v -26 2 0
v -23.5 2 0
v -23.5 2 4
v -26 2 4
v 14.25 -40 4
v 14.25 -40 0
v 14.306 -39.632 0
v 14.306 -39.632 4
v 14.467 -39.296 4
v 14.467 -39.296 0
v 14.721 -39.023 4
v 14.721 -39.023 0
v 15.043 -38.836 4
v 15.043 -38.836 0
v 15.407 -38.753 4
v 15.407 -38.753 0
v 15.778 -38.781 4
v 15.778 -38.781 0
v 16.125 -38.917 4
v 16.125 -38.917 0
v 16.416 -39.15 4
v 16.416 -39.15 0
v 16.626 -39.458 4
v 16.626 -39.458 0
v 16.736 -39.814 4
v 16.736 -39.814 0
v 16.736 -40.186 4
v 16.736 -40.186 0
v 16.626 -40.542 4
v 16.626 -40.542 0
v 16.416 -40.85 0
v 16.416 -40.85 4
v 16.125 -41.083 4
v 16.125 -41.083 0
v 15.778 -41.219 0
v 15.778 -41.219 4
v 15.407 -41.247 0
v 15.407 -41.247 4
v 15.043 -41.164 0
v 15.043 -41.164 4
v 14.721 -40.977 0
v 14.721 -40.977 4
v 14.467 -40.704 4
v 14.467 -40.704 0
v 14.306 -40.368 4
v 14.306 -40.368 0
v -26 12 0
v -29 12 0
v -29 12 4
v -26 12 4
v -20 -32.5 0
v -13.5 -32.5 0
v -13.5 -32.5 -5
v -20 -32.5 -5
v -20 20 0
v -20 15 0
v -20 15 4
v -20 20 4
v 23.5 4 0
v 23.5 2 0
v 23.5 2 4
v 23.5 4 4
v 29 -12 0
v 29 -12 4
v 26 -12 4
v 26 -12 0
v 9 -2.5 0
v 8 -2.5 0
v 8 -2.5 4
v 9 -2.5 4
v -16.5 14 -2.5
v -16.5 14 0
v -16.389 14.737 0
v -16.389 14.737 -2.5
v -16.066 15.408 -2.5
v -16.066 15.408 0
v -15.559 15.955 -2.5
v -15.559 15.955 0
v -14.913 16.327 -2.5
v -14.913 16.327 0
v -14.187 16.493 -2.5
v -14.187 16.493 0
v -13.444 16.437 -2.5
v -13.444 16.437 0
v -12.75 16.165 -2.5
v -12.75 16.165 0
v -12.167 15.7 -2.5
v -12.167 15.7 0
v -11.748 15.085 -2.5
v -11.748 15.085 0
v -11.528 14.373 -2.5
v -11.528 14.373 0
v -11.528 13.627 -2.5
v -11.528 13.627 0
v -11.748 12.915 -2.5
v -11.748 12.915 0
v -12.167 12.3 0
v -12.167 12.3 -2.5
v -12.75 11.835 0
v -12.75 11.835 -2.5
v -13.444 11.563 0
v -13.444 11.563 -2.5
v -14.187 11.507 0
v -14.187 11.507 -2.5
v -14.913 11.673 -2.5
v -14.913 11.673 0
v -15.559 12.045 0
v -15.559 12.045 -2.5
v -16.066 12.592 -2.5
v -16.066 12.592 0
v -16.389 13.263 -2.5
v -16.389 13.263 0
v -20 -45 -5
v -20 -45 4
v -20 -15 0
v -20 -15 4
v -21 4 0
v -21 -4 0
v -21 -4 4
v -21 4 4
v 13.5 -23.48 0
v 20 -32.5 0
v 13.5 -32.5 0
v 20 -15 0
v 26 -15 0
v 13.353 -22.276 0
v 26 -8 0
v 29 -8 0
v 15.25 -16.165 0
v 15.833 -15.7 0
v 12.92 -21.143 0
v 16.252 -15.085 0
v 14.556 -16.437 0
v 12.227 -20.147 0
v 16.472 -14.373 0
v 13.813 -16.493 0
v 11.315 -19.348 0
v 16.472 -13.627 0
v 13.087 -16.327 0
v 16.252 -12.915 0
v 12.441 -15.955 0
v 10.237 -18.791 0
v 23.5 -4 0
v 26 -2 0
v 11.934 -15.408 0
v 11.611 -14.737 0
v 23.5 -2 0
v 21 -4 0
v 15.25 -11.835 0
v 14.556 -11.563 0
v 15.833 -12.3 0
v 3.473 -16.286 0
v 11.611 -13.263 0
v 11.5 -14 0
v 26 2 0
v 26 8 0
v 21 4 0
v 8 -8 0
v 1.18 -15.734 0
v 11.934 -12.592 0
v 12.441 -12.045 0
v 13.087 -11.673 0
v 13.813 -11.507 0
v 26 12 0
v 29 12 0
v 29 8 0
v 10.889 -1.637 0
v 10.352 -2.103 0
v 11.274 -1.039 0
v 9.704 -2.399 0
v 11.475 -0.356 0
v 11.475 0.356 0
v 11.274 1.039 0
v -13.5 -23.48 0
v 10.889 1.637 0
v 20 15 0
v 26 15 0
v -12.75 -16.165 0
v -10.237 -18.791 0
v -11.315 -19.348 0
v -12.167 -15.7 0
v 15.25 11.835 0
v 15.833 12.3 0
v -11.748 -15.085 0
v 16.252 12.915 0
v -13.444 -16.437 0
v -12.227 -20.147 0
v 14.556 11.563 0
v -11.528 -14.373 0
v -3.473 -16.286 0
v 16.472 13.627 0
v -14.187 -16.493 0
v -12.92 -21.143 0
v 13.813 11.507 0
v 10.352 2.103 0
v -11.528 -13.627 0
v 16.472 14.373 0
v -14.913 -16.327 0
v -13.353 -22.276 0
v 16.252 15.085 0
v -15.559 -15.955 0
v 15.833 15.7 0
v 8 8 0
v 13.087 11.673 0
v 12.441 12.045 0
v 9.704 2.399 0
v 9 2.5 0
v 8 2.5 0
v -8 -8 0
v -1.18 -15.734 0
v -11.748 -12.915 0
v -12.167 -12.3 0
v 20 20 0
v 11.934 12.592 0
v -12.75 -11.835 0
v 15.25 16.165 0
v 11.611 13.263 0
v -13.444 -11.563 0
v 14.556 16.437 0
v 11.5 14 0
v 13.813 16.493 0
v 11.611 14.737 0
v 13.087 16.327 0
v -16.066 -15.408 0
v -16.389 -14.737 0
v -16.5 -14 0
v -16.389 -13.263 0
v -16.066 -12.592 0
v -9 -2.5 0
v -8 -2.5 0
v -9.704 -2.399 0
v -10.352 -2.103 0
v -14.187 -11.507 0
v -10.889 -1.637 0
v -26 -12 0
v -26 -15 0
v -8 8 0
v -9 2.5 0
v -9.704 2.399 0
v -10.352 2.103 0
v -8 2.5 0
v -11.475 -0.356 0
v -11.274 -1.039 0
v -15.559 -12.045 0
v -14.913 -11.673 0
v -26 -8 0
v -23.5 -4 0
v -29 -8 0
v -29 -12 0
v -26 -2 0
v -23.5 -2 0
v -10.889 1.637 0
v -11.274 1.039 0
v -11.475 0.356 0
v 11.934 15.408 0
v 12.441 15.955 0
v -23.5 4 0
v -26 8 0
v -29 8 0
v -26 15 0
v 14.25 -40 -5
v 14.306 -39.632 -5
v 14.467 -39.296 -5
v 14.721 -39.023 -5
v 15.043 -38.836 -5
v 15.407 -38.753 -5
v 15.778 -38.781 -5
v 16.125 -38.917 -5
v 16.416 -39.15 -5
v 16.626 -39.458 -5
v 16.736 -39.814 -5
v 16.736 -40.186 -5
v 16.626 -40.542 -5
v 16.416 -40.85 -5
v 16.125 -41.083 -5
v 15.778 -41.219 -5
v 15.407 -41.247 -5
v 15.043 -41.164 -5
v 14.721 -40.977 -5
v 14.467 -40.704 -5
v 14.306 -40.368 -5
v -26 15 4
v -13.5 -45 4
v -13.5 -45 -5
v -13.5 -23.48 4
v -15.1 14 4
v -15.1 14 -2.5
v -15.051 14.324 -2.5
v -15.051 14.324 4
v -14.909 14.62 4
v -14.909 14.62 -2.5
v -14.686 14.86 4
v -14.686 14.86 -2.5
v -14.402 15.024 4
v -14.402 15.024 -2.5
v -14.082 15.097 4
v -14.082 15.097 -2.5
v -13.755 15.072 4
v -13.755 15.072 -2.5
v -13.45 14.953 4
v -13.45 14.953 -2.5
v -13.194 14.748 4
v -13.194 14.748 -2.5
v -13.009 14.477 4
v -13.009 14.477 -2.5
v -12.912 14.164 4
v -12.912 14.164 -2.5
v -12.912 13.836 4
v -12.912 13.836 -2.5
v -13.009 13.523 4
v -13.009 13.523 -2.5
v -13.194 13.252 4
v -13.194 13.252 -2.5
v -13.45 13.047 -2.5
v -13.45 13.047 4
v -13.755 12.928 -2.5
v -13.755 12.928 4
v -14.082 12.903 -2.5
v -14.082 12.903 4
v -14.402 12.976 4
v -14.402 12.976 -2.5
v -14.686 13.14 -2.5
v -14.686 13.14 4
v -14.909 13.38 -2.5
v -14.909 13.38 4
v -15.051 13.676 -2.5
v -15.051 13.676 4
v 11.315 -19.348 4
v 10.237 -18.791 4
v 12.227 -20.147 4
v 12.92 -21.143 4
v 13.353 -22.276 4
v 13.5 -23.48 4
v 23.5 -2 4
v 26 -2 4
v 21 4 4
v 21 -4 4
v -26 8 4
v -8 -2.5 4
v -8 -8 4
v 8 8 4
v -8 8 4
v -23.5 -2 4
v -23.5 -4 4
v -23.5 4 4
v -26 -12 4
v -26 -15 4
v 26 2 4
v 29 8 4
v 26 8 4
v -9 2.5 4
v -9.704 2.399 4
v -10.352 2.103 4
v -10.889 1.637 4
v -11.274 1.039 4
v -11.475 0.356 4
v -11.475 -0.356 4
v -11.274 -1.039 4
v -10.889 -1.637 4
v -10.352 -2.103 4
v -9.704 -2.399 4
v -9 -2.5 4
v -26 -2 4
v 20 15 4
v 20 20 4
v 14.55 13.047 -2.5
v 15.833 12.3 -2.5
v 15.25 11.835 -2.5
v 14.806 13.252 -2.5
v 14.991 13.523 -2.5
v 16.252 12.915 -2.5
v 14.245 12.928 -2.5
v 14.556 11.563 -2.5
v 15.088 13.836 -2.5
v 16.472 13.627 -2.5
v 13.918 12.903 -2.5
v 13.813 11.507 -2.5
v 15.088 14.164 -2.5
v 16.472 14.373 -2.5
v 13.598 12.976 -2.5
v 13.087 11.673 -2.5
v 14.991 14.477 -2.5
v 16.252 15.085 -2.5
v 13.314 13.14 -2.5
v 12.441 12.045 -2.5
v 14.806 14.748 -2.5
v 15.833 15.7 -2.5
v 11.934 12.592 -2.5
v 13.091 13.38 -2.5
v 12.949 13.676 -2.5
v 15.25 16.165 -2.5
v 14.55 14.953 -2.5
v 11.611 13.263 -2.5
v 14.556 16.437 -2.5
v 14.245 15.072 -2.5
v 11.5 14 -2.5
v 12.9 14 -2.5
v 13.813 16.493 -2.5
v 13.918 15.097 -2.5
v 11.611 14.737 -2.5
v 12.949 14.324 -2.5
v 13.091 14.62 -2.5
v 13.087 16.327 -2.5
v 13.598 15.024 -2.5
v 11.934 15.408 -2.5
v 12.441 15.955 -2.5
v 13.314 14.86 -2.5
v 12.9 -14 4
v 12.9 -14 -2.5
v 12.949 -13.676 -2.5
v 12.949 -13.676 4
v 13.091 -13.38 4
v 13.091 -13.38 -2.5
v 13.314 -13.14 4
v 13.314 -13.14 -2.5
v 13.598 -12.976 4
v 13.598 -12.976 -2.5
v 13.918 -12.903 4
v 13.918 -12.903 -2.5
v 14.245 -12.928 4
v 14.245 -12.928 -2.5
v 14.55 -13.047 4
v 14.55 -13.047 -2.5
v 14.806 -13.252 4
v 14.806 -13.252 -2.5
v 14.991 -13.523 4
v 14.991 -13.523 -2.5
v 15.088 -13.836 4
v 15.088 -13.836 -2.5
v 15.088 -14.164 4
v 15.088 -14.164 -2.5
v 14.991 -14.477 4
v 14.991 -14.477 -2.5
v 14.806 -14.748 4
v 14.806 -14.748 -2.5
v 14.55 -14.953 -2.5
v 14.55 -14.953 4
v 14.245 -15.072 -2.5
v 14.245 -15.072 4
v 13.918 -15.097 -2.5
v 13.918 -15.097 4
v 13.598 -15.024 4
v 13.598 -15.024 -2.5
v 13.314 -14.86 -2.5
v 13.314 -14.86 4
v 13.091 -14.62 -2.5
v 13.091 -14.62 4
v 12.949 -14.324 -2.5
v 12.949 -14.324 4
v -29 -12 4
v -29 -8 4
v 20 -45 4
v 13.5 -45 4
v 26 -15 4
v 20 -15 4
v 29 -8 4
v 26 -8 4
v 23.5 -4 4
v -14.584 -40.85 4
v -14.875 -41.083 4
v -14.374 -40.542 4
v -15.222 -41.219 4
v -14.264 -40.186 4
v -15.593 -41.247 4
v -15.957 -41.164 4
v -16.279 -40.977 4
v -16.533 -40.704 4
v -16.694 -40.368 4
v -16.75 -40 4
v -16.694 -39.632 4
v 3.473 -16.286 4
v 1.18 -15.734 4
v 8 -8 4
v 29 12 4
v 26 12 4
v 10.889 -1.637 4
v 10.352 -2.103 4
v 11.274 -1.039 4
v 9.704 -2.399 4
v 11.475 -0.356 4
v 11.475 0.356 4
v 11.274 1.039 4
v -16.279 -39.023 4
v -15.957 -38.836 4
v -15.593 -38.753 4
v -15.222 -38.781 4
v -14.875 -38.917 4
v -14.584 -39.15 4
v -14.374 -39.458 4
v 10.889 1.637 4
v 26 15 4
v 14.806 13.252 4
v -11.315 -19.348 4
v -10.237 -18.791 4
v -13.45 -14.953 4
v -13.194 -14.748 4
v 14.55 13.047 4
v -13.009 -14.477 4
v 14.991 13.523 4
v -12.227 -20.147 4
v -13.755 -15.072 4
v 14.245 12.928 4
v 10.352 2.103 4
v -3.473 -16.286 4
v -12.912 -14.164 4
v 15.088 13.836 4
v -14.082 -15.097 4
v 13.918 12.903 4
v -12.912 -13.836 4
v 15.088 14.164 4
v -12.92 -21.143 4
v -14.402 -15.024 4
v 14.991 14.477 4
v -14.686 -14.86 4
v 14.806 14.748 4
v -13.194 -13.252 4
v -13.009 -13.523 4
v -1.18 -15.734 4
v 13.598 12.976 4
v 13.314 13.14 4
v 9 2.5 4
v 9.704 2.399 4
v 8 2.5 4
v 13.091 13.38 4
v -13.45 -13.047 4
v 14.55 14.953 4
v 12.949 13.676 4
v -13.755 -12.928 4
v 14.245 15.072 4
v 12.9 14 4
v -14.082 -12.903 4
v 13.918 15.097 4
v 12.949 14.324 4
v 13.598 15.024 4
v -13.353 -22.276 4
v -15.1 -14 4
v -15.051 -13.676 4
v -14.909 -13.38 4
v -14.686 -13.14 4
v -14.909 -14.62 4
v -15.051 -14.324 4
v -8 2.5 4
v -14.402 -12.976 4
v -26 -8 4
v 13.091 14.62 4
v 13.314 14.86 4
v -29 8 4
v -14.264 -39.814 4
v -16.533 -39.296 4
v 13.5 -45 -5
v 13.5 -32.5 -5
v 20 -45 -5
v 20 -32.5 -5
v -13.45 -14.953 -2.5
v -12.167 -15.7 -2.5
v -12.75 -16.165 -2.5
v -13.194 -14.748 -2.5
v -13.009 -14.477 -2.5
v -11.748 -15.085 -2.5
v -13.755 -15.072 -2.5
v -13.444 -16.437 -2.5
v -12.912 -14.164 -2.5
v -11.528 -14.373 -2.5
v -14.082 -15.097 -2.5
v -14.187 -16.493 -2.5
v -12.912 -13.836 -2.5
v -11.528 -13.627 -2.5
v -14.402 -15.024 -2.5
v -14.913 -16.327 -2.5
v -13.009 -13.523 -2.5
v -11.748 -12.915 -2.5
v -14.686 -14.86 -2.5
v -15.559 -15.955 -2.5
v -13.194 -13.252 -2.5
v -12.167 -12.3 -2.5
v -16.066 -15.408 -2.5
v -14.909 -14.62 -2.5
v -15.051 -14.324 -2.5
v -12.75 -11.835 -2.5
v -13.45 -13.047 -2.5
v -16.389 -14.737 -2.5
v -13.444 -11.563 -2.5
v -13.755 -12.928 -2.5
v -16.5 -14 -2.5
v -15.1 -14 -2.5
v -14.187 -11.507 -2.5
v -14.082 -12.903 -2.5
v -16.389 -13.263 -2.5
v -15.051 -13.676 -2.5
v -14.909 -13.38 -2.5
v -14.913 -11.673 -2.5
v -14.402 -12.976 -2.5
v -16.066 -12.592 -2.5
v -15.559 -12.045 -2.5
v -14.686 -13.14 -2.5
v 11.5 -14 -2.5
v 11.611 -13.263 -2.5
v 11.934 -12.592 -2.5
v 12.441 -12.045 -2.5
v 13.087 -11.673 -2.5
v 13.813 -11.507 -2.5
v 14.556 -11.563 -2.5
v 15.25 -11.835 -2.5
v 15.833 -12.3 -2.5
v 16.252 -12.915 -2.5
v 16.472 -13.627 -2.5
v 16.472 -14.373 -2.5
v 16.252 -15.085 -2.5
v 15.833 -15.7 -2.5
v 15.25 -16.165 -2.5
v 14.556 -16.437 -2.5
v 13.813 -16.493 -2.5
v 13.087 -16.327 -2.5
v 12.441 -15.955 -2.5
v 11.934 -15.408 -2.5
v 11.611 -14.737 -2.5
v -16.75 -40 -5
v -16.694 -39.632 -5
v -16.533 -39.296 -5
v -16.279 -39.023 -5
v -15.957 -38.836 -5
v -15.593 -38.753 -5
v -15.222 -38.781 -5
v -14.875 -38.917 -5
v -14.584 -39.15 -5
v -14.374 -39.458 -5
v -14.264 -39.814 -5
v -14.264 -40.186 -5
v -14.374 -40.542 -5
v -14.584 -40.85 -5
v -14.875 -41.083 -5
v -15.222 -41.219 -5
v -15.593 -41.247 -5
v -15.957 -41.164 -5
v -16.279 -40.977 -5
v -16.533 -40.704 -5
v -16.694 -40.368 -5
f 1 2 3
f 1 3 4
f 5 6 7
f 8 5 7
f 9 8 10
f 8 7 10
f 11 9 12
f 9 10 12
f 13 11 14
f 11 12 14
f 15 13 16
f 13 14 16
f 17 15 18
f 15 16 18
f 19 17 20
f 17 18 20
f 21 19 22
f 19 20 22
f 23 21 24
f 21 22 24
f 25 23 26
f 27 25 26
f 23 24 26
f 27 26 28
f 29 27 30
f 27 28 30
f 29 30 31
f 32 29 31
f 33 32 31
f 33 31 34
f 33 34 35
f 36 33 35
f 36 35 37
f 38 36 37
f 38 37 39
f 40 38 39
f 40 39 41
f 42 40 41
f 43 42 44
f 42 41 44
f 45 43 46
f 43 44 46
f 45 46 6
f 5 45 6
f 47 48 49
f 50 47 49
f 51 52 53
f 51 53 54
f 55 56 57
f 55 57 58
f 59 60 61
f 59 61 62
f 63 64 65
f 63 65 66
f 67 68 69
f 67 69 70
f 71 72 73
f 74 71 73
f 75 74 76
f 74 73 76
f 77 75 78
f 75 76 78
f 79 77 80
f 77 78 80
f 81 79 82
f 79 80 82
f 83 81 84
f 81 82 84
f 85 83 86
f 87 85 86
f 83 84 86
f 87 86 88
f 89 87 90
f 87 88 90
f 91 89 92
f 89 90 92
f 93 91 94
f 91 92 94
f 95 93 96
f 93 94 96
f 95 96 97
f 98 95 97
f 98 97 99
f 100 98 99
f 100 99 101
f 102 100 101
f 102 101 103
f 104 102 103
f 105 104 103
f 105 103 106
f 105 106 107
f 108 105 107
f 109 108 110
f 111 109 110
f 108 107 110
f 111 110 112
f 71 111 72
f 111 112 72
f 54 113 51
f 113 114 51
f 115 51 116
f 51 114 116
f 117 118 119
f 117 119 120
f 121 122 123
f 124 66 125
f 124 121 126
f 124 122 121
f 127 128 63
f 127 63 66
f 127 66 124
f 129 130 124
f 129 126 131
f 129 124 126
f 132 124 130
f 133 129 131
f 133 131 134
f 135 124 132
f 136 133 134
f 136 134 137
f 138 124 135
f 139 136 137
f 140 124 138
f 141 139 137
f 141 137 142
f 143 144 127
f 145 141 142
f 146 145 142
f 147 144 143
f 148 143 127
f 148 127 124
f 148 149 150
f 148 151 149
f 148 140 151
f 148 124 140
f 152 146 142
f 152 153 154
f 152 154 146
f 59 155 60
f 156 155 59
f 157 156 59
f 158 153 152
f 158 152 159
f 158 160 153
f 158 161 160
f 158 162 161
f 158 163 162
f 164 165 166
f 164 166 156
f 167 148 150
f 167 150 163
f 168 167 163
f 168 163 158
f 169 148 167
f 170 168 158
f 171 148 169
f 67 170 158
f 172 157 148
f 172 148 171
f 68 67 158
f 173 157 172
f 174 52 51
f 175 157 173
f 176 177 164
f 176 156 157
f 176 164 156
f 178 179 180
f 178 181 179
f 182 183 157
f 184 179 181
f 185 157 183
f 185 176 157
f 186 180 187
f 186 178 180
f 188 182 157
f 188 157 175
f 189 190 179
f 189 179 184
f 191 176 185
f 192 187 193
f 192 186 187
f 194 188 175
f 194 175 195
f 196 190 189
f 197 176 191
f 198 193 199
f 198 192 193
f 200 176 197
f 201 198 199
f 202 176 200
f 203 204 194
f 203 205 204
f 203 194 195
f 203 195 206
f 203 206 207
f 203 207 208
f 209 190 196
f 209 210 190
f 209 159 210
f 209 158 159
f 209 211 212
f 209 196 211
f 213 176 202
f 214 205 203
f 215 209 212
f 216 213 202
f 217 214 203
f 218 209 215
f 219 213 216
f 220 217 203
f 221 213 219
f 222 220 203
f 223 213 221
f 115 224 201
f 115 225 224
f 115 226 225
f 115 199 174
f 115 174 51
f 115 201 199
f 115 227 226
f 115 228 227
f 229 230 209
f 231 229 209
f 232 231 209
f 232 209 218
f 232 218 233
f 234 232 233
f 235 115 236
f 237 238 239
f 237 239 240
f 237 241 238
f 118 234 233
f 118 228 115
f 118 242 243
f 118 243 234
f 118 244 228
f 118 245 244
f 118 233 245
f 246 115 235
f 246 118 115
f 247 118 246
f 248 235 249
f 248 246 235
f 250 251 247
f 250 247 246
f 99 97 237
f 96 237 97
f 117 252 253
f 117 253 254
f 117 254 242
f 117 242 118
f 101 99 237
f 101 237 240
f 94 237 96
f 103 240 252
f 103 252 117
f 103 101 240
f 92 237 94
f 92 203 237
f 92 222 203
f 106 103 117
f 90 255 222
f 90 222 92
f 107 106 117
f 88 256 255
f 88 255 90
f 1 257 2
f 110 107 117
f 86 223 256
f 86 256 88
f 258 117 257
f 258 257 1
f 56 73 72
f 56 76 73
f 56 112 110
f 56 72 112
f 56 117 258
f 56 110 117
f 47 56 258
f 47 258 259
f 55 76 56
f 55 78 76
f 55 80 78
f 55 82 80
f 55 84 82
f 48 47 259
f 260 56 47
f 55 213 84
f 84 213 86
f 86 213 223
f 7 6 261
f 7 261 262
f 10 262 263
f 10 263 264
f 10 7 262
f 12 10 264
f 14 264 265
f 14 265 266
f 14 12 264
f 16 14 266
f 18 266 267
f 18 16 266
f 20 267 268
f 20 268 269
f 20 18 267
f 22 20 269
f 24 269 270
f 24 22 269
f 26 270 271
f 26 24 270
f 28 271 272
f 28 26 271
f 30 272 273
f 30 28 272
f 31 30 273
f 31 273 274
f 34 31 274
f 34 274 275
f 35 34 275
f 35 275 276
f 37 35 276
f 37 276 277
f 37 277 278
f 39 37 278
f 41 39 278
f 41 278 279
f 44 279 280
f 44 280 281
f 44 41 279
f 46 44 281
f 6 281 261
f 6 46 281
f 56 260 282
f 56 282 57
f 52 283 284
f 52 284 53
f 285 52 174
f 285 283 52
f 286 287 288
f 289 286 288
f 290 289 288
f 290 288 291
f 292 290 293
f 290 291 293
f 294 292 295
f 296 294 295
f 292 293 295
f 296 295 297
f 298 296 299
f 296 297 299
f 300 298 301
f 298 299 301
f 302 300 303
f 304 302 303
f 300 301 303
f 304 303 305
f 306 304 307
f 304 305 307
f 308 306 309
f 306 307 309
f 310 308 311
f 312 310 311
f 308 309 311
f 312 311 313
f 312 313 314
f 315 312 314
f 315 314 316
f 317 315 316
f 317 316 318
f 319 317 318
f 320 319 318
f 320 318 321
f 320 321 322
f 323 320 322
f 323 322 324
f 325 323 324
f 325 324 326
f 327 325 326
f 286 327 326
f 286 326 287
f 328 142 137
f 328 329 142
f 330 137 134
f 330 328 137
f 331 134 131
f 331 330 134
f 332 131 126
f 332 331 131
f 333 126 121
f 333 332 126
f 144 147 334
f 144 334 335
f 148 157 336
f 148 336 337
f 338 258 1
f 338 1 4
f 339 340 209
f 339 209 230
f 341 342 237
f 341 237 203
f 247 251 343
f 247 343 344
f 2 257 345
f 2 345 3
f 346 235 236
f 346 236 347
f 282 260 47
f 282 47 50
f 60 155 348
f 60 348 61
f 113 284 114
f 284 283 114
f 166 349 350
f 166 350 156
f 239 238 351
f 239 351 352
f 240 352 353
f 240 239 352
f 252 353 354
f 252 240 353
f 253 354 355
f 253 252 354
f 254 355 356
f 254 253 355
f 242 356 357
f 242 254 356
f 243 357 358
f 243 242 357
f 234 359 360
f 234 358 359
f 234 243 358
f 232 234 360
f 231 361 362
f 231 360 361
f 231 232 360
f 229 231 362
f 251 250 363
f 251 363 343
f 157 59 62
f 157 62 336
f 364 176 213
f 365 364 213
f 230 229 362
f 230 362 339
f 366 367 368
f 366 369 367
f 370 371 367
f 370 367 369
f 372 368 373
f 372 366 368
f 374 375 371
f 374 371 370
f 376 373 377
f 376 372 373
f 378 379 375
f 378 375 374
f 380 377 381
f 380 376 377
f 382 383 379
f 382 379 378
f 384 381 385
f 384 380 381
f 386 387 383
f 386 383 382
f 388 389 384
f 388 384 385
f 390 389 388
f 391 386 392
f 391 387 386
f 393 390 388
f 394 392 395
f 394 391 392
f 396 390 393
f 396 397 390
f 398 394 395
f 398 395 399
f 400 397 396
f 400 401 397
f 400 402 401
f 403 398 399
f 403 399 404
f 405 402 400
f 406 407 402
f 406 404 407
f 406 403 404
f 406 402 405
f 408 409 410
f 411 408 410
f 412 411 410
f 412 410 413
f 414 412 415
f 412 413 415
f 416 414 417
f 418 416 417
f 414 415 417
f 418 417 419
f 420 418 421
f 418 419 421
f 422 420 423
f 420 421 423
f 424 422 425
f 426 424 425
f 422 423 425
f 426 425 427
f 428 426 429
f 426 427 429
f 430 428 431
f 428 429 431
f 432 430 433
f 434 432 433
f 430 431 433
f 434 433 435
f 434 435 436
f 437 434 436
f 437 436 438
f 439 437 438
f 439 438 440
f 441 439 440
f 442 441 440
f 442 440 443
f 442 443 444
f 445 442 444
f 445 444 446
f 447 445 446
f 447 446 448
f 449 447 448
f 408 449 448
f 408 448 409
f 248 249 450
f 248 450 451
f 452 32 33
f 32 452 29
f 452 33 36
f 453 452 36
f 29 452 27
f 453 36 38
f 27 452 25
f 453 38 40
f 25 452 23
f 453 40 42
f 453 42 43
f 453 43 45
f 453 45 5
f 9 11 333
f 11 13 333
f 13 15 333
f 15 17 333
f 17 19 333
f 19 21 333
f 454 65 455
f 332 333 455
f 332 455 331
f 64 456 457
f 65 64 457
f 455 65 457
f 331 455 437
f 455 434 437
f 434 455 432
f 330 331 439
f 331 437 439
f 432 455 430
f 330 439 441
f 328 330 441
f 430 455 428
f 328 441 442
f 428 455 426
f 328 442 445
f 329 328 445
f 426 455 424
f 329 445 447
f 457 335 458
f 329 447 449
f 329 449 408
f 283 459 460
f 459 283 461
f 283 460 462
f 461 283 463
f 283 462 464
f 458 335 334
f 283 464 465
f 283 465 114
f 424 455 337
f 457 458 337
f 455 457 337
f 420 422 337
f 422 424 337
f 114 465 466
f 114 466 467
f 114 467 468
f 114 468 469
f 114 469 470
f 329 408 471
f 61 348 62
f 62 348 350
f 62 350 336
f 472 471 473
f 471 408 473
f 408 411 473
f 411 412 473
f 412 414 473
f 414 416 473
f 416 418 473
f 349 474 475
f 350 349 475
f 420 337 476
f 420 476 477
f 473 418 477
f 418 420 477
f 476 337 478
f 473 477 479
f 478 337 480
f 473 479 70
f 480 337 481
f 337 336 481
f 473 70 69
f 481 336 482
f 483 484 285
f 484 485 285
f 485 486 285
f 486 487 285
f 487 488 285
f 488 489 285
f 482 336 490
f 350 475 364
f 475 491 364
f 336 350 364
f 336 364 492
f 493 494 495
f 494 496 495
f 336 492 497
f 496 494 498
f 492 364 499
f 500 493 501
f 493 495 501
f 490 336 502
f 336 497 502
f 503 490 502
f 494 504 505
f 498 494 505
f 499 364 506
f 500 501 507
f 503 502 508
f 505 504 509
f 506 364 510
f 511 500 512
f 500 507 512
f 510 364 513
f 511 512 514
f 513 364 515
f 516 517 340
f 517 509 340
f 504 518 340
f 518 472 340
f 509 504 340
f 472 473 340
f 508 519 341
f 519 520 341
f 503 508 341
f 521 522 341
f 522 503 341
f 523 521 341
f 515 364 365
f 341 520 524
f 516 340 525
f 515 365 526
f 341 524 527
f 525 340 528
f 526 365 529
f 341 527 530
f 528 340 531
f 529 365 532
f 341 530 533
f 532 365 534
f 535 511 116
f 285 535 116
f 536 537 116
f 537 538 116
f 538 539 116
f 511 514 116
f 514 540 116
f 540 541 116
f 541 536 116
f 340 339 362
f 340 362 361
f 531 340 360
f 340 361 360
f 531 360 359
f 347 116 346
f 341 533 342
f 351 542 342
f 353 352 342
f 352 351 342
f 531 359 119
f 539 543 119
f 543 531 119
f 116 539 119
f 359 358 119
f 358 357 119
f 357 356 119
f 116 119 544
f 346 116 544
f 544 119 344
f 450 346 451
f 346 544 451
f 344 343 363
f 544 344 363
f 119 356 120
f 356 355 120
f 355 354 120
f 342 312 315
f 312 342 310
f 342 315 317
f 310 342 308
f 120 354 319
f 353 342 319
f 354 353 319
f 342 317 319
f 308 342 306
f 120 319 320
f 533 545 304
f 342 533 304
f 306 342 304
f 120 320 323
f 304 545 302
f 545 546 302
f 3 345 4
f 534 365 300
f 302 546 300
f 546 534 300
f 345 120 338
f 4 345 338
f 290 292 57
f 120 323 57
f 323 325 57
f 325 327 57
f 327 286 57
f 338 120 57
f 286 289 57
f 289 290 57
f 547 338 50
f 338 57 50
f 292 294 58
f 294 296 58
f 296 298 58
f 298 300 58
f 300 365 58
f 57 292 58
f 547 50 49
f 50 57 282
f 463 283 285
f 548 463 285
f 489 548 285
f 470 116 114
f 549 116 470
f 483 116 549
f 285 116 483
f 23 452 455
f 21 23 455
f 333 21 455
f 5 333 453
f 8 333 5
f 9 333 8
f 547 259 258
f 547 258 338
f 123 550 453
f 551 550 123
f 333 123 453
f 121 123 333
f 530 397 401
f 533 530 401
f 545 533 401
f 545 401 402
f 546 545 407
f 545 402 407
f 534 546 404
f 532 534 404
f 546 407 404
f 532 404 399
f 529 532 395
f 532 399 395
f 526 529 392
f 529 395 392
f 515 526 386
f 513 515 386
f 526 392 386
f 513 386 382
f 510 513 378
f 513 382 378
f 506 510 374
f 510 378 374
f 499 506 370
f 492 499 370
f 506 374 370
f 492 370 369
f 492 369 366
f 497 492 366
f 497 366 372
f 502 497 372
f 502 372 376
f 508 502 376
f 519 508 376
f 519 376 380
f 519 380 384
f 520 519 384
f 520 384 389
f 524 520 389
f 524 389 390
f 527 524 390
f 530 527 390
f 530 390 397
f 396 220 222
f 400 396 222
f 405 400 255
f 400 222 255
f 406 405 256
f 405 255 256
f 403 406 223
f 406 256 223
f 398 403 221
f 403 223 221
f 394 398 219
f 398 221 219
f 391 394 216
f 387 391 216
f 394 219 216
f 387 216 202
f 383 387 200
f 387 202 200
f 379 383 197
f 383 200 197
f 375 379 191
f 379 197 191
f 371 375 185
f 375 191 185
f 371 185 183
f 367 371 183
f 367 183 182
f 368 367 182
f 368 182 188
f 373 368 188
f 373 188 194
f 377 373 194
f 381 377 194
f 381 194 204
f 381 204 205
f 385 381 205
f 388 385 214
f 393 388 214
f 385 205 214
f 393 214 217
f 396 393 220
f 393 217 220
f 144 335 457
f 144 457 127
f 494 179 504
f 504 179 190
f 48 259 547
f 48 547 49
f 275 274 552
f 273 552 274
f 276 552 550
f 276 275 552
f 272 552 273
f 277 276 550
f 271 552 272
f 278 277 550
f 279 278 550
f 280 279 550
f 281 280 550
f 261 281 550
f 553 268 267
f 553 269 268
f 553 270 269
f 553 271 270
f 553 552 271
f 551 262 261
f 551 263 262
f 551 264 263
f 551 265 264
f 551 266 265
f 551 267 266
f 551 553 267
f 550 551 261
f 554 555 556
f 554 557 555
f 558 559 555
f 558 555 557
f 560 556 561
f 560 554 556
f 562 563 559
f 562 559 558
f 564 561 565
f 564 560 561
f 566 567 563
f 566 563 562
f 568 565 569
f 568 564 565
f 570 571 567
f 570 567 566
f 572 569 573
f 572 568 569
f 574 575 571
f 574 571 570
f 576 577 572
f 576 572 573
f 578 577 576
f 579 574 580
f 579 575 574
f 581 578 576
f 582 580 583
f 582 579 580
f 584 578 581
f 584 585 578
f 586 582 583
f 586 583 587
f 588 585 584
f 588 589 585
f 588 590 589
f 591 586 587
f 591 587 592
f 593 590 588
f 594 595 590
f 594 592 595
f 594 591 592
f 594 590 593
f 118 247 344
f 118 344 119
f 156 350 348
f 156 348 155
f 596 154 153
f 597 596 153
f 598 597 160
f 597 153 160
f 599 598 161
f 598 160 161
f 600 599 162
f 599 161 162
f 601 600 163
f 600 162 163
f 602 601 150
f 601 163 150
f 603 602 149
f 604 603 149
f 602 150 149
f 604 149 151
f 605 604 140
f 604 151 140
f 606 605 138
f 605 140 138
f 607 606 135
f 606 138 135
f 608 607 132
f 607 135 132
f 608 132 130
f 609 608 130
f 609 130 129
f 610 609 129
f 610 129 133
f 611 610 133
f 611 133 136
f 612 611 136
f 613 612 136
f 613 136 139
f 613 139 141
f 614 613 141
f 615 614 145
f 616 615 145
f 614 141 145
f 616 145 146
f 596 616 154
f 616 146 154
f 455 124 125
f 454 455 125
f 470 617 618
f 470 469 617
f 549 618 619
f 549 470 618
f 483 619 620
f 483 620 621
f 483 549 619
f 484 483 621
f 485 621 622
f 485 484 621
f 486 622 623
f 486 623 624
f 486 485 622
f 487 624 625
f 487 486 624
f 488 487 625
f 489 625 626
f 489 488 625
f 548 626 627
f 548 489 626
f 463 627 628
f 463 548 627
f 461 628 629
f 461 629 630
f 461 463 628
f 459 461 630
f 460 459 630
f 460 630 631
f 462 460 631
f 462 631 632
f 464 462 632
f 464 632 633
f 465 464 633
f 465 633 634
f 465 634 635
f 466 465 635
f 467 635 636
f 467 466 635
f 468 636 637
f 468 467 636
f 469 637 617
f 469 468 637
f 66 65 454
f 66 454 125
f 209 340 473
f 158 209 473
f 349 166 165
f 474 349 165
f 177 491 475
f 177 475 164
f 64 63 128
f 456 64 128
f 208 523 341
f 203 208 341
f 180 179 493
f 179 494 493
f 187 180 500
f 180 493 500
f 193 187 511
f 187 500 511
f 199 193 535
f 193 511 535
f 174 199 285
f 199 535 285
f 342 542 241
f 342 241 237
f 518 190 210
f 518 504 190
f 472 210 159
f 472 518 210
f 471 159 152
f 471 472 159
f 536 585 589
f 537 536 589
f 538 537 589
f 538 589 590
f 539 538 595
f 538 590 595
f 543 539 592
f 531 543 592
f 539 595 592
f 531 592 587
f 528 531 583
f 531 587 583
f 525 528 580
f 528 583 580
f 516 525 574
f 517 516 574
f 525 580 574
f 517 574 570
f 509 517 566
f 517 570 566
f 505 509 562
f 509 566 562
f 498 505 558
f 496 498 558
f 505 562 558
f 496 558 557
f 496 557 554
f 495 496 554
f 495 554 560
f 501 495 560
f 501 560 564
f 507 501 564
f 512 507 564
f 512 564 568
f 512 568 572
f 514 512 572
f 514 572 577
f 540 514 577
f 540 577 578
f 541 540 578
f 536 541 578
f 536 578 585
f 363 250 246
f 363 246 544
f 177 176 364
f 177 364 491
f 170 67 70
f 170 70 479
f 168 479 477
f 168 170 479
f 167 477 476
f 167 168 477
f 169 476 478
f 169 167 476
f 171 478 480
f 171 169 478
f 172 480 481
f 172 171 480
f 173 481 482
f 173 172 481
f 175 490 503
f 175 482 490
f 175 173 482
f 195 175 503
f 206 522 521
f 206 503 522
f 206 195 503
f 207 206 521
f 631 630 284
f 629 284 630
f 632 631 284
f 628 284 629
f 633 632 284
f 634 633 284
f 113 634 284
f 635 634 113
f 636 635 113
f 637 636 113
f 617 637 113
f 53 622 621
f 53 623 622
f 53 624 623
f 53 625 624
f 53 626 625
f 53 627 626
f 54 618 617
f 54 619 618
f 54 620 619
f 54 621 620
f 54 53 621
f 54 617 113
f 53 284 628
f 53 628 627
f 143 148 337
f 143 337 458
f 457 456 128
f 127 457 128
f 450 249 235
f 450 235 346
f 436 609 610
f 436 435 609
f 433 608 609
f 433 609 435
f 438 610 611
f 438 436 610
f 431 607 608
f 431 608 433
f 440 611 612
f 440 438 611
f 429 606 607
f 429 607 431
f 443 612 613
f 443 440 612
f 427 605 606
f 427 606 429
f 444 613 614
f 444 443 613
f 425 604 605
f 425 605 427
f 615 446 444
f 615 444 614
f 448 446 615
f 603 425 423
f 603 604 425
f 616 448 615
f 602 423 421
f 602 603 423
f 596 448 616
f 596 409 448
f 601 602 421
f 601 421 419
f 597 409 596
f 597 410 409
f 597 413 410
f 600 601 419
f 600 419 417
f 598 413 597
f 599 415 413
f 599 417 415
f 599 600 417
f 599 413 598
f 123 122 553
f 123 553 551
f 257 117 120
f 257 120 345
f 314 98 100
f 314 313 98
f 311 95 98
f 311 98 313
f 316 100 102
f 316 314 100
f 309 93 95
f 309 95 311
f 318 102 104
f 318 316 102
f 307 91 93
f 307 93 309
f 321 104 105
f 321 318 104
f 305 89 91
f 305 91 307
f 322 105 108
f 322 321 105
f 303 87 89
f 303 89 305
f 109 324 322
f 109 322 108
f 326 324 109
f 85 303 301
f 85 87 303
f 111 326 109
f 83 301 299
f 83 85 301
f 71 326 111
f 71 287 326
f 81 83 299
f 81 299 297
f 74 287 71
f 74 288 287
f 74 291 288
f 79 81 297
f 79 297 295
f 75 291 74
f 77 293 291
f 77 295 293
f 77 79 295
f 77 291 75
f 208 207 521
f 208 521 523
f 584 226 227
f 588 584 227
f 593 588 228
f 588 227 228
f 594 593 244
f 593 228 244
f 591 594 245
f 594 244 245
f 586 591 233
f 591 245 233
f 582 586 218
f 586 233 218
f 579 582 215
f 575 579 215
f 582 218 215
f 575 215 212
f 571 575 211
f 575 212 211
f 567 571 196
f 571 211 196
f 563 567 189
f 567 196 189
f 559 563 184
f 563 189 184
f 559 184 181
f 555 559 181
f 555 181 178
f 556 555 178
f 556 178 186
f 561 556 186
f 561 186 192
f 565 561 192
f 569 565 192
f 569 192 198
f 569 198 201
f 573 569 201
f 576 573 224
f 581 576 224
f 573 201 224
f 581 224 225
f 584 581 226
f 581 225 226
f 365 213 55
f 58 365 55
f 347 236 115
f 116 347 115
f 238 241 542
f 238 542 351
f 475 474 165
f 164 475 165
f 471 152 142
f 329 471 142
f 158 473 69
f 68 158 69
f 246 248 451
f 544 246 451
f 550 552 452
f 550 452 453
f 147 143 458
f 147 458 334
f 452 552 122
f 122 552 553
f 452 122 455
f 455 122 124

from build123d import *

# Parameters (mm, degrees)
SKETCH_1_W           = 58
SKETCH_1_H           = 30
EXTRUDE_1_DEPTH      = 4
SKETCH_2_W           = 4
SKETCH_2_H           = 3
SKETCH_2_H_2         = 6
SKETCH_2_H_3         = 4
CUT_EXTRUDE_2_DEPTH  = 3
SKETCH_3_W           = 4
SKETCH_3_H           = 3
SKETCH_3_H_2         = 6
SKETCH_3_H_3         = 4
CUT_EXTRUDE_3_DEPTH  = 3
CUT_EXTRUDE_4_DEPTH  = 5
SKETCH_5_R           = 7.5
CUT_EXTRUDE_5_DEPTH  = 5
SKETCH_11_W          = 16
SKETCH_11_H          = 16
CUT_EXTRUDE_10_DEPTH = 10
SKETCH_12_W          = 40
SKETCH_12_H          = 5
EXTRUDE_2_DEPTH      = 4
SKETCH_13_R          = 2.5
EXTRUDE_3_DEPTH      = 2.5
SKETCH_14_R          = 1.1
CUT_EXTRUDE_11_DEPTH = 7.5
SKETCH_15_W          = 6.5
SKETCH_15_H          = 25
SKETCH_15_R          = 1.25
EXTRUDE_4_DEPTH      = 4
SKETCH_16_W          = 6.5
SKETCH_16_H          = 12.5
SKETCH_16_R          = 1.25
EXTRUDE_5_DEPTH      = 5
CUT_EXTRUDE_12_DEPTH = 5
FILLET_1_R           = 10
FILLET_2_R           = 5


with BuildPart() as part:
    # 草图1 → 凸台-拉伸1 (new body)
    with BuildSketch(Plane.XY):
        Rectangle(SKETCH_1_W, SKETCH_1_H)
    extrude(amount=EXTRUDE_1_DEPTH)

    # 草图2 → 切除-拉伸2 (cut)
    with BuildSketch(Plane(origin=(29, 0, 0), x_dir=(0, 0, -1), z_dir=(1, 0, 0))):
        with Locations((-2, 13.5)):
            Rectangle(SKETCH_2_W, SKETCH_2_H)
        with Locations((-2, 5)):
            Rectangle(SKETCH_2_W, SKETCH_2_H_2)
        with Locations((-2, 0)):
            Rectangle(SKETCH_2_W, SKETCH_2_H_3)
        with Locations((-2, -5)):
            Rectangle(SKETCH_2_W, SKETCH_2_H_2)
        with Locations((-2, -13.5)):
            Rectangle(SKETCH_2_W, SKETCH_2_H)
    extrude(amount=-CUT_EXTRUDE_2_DEPTH, mode=Mode.SUBTRACT)

    # 草图3 → 切除-拉伸3 (cut)
    with BuildSketch(Plane.ZY.offset(29)):
        with Locations((2, 13.5)):
            Rectangle(SKETCH_3_W, SKETCH_3_H)
        with Locations((2, 5)):
            Rectangle(SKETCH_3_W, SKETCH_3_H_2)
        with Locations((2, 0)):
            Rectangle(SKETCH_3_W, SKETCH_3_H_3)
        with Locations((2, -5)):
            Rectangle(SKETCH_3_W, SKETCH_3_H_2)
        with Locations((2, -13.5)):
            Rectangle(SKETCH_3_W, SKETCH_3_H)
    extrude(amount=-CUT_EXTRUDE_3_DEPTH, mode=Mode.SUBTRACT)

    # 草图4 → 切除-拉伸4 (cut, through all)
    with BuildSketch(Plane(origin=(0, 0, 0), x_dir=(-1, 0, 0), z_dir=(0, 0, -1))):
        Polygon((-26, 2), (-23.5, 2), (-23.5, 4), (-21, 4), (-21, -4), (-23.5, -4), (-23.5, -2), (-26, -2), align=None)
        Polygon((26, -2), (23.5, -2), (23.5, -4), (21, -4), (21, 4), (23.5, 4), (23.5, 2), (26, 2), align=None)
    extrude(amount=-CUT_EXTRUDE_4_DEPTH, mode=Mode.SUBTRACT)

    # 草图5 → 切除-拉伸5 (cut, through all)
    with BuildSketch(Plane(origin=(0, 0, 0), x_dir=(-1, 0, 0), z_dir=(0, 0, -1))):
        Circle(SKETCH_5_R)
        with BuildLine():
            Line((-9, 2.5), (9, 2.5))
            ThreePointArc((9, 2.5), (11.5, 0), (9, -2.5))
            Line((9, -2.5), (-9, -2.5))
            ThreePointArc((-9, -2.5), (-11.5, 0), (-9, 2.5))
        make_face()
    extrude(amount=-CUT_EXTRUDE_5_DEPTH, mode=Mode.SUBTRACT)

    # 草图11 → 切除-拉伸10 (cut)
    with BuildSketch(Plane.XY.offset(4)):
        Rectangle(SKETCH_11_W, SKETCH_11_H)
    extrude(amount=-CUT_EXTRUDE_10_DEPTH, mode=Mode.SUBTRACT)

    # 草图12 → 凸台-拉伸2 (add)
    with BuildSketch(Plane(origin=(0, 0, 0), x_dir=(-1, 0, 0), z_dir=(0, 0, -1))):
        with Locations((0, 17.5)):
            Rectangle(SKETCH_12_W, SKETCH_12_H)
        with Locations((0, -17.5)):
            Rectangle(SKETCH_12_W, SKETCH_12_H)
    extrude(amount=-EXTRUDE_2_DEPTH)

    # 草图13 → 凸台-拉伸3 (add)
    with BuildSketch(Plane(origin=(0, 0, 0), x_dir=(-1, 0, 0), z_dir=(0, 0, -1))):
        with Locations((14, -14)):
            Circle(SKETCH_13_R)
        with Locations((-14, -14)):
            Circle(SKETCH_13_R)
        with Locations((14, 14)):
            Circle(SKETCH_13_R)
        with Locations((-14, 14)):
            Circle(SKETCH_13_R)
    extrude(amount=EXTRUDE_3_DEPTH)

    # 草图14 → 切除-拉伸11 (cut, through all)
    with BuildSketch(Plane(origin=(0, 0, -2.5), x_dir=(-1, 0, 0), z_dir=(0, 0, -1))):
        with Locations((14, -14)):
            Circle(SKETCH_14_R)
        with Locations((-14, -14)):
            Circle(SKETCH_14_R)
        with Locations((-14, 14)):
            Circle(SKETCH_14_R)
        with Locations((14, 14)):
            Circle(SKETCH_14_R)
    extrude(amount=-CUT_EXTRUDE_11_DEPTH, mode=Mode.SUBTRACT)

    # 草图15 → 凸台-拉伸4 (add)
    with BuildSketch(Plane(origin=(0, 0, 0), x_dir=(-1, 0, 0), z_dir=(0, 0, -1))):
        with Locations((16.75, -32.5)):
            Rectangle(SKETCH_15_W, SKETCH_15_H)
        with Locations((15.5, -40)):
            Circle(SKETCH_15_R, mode=Mode.SUBTRACT)
        with Locations((-16.75, -32.5)):
            Rectangle(SKETCH_15_W, SKETCH_15_H)
        with Locations((-15.5, -40)):
            Circle(SKETCH_15_R, mode=Mode.SUBTRACT)
    extrude(amount=-EXTRUDE_4_DEPTH)

    # 草图16 → 凸台-拉伸5 (add)
    with BuildSketch(Plane(origin=(0, 0, 0), x_dir=(-1, 0, 0), z_dir=(0, 0, -1))):
        with Locations((16.75, -38.75)):
            Rectangle(SKETCH_16_W, SKETCH_16_H)
        with Locations((15.5, -40)):
            Circle(SKETCH_16_R, mode=Mode.SUBTRACT)
        with Locations((-16.75, -38.75)):
            Rectangle(SKETCH_16_W, SKETCH_16_H)
        with Locations((-15.5, -40)):
            Circle(SKETCH_16_R, mode=Mode.SUBTRACT)
    extrude(amount=EXTRUDE_5_DEPTH)

    # 草图17 → 切除-拉伸12 (cut, through all)
    with BuildSketch(Plane(origin=(0, 0, 0), x_dir=(-1, 0, 0), z_dir=(0, 0, -1))):
        Polygon((13.5, -20), (0, -15), (-13.5, -20), align=None)
    extrude(amount=-CUT_EXTRUDE_12_DEPTH, mode=Mode.SUBTRACT)

    # 圆角1
    fillet_1_edges = [part.edges().sort_by_distance(p)[0] for p in [
        (0, -15, 2),
    ]]
    fillet(fillet_1_edges, radius=FILLET_1_R)

    # 圆角2
    fillet_2_edges = [part.edges().sort_by_distance(p)[0] for p in [
        (13.5, -20, 2),
        (-13.5, -20, 2),
    ]]
    fillet(fillet_2_edges, radius=FILLET_2_R)


solid = part.part
